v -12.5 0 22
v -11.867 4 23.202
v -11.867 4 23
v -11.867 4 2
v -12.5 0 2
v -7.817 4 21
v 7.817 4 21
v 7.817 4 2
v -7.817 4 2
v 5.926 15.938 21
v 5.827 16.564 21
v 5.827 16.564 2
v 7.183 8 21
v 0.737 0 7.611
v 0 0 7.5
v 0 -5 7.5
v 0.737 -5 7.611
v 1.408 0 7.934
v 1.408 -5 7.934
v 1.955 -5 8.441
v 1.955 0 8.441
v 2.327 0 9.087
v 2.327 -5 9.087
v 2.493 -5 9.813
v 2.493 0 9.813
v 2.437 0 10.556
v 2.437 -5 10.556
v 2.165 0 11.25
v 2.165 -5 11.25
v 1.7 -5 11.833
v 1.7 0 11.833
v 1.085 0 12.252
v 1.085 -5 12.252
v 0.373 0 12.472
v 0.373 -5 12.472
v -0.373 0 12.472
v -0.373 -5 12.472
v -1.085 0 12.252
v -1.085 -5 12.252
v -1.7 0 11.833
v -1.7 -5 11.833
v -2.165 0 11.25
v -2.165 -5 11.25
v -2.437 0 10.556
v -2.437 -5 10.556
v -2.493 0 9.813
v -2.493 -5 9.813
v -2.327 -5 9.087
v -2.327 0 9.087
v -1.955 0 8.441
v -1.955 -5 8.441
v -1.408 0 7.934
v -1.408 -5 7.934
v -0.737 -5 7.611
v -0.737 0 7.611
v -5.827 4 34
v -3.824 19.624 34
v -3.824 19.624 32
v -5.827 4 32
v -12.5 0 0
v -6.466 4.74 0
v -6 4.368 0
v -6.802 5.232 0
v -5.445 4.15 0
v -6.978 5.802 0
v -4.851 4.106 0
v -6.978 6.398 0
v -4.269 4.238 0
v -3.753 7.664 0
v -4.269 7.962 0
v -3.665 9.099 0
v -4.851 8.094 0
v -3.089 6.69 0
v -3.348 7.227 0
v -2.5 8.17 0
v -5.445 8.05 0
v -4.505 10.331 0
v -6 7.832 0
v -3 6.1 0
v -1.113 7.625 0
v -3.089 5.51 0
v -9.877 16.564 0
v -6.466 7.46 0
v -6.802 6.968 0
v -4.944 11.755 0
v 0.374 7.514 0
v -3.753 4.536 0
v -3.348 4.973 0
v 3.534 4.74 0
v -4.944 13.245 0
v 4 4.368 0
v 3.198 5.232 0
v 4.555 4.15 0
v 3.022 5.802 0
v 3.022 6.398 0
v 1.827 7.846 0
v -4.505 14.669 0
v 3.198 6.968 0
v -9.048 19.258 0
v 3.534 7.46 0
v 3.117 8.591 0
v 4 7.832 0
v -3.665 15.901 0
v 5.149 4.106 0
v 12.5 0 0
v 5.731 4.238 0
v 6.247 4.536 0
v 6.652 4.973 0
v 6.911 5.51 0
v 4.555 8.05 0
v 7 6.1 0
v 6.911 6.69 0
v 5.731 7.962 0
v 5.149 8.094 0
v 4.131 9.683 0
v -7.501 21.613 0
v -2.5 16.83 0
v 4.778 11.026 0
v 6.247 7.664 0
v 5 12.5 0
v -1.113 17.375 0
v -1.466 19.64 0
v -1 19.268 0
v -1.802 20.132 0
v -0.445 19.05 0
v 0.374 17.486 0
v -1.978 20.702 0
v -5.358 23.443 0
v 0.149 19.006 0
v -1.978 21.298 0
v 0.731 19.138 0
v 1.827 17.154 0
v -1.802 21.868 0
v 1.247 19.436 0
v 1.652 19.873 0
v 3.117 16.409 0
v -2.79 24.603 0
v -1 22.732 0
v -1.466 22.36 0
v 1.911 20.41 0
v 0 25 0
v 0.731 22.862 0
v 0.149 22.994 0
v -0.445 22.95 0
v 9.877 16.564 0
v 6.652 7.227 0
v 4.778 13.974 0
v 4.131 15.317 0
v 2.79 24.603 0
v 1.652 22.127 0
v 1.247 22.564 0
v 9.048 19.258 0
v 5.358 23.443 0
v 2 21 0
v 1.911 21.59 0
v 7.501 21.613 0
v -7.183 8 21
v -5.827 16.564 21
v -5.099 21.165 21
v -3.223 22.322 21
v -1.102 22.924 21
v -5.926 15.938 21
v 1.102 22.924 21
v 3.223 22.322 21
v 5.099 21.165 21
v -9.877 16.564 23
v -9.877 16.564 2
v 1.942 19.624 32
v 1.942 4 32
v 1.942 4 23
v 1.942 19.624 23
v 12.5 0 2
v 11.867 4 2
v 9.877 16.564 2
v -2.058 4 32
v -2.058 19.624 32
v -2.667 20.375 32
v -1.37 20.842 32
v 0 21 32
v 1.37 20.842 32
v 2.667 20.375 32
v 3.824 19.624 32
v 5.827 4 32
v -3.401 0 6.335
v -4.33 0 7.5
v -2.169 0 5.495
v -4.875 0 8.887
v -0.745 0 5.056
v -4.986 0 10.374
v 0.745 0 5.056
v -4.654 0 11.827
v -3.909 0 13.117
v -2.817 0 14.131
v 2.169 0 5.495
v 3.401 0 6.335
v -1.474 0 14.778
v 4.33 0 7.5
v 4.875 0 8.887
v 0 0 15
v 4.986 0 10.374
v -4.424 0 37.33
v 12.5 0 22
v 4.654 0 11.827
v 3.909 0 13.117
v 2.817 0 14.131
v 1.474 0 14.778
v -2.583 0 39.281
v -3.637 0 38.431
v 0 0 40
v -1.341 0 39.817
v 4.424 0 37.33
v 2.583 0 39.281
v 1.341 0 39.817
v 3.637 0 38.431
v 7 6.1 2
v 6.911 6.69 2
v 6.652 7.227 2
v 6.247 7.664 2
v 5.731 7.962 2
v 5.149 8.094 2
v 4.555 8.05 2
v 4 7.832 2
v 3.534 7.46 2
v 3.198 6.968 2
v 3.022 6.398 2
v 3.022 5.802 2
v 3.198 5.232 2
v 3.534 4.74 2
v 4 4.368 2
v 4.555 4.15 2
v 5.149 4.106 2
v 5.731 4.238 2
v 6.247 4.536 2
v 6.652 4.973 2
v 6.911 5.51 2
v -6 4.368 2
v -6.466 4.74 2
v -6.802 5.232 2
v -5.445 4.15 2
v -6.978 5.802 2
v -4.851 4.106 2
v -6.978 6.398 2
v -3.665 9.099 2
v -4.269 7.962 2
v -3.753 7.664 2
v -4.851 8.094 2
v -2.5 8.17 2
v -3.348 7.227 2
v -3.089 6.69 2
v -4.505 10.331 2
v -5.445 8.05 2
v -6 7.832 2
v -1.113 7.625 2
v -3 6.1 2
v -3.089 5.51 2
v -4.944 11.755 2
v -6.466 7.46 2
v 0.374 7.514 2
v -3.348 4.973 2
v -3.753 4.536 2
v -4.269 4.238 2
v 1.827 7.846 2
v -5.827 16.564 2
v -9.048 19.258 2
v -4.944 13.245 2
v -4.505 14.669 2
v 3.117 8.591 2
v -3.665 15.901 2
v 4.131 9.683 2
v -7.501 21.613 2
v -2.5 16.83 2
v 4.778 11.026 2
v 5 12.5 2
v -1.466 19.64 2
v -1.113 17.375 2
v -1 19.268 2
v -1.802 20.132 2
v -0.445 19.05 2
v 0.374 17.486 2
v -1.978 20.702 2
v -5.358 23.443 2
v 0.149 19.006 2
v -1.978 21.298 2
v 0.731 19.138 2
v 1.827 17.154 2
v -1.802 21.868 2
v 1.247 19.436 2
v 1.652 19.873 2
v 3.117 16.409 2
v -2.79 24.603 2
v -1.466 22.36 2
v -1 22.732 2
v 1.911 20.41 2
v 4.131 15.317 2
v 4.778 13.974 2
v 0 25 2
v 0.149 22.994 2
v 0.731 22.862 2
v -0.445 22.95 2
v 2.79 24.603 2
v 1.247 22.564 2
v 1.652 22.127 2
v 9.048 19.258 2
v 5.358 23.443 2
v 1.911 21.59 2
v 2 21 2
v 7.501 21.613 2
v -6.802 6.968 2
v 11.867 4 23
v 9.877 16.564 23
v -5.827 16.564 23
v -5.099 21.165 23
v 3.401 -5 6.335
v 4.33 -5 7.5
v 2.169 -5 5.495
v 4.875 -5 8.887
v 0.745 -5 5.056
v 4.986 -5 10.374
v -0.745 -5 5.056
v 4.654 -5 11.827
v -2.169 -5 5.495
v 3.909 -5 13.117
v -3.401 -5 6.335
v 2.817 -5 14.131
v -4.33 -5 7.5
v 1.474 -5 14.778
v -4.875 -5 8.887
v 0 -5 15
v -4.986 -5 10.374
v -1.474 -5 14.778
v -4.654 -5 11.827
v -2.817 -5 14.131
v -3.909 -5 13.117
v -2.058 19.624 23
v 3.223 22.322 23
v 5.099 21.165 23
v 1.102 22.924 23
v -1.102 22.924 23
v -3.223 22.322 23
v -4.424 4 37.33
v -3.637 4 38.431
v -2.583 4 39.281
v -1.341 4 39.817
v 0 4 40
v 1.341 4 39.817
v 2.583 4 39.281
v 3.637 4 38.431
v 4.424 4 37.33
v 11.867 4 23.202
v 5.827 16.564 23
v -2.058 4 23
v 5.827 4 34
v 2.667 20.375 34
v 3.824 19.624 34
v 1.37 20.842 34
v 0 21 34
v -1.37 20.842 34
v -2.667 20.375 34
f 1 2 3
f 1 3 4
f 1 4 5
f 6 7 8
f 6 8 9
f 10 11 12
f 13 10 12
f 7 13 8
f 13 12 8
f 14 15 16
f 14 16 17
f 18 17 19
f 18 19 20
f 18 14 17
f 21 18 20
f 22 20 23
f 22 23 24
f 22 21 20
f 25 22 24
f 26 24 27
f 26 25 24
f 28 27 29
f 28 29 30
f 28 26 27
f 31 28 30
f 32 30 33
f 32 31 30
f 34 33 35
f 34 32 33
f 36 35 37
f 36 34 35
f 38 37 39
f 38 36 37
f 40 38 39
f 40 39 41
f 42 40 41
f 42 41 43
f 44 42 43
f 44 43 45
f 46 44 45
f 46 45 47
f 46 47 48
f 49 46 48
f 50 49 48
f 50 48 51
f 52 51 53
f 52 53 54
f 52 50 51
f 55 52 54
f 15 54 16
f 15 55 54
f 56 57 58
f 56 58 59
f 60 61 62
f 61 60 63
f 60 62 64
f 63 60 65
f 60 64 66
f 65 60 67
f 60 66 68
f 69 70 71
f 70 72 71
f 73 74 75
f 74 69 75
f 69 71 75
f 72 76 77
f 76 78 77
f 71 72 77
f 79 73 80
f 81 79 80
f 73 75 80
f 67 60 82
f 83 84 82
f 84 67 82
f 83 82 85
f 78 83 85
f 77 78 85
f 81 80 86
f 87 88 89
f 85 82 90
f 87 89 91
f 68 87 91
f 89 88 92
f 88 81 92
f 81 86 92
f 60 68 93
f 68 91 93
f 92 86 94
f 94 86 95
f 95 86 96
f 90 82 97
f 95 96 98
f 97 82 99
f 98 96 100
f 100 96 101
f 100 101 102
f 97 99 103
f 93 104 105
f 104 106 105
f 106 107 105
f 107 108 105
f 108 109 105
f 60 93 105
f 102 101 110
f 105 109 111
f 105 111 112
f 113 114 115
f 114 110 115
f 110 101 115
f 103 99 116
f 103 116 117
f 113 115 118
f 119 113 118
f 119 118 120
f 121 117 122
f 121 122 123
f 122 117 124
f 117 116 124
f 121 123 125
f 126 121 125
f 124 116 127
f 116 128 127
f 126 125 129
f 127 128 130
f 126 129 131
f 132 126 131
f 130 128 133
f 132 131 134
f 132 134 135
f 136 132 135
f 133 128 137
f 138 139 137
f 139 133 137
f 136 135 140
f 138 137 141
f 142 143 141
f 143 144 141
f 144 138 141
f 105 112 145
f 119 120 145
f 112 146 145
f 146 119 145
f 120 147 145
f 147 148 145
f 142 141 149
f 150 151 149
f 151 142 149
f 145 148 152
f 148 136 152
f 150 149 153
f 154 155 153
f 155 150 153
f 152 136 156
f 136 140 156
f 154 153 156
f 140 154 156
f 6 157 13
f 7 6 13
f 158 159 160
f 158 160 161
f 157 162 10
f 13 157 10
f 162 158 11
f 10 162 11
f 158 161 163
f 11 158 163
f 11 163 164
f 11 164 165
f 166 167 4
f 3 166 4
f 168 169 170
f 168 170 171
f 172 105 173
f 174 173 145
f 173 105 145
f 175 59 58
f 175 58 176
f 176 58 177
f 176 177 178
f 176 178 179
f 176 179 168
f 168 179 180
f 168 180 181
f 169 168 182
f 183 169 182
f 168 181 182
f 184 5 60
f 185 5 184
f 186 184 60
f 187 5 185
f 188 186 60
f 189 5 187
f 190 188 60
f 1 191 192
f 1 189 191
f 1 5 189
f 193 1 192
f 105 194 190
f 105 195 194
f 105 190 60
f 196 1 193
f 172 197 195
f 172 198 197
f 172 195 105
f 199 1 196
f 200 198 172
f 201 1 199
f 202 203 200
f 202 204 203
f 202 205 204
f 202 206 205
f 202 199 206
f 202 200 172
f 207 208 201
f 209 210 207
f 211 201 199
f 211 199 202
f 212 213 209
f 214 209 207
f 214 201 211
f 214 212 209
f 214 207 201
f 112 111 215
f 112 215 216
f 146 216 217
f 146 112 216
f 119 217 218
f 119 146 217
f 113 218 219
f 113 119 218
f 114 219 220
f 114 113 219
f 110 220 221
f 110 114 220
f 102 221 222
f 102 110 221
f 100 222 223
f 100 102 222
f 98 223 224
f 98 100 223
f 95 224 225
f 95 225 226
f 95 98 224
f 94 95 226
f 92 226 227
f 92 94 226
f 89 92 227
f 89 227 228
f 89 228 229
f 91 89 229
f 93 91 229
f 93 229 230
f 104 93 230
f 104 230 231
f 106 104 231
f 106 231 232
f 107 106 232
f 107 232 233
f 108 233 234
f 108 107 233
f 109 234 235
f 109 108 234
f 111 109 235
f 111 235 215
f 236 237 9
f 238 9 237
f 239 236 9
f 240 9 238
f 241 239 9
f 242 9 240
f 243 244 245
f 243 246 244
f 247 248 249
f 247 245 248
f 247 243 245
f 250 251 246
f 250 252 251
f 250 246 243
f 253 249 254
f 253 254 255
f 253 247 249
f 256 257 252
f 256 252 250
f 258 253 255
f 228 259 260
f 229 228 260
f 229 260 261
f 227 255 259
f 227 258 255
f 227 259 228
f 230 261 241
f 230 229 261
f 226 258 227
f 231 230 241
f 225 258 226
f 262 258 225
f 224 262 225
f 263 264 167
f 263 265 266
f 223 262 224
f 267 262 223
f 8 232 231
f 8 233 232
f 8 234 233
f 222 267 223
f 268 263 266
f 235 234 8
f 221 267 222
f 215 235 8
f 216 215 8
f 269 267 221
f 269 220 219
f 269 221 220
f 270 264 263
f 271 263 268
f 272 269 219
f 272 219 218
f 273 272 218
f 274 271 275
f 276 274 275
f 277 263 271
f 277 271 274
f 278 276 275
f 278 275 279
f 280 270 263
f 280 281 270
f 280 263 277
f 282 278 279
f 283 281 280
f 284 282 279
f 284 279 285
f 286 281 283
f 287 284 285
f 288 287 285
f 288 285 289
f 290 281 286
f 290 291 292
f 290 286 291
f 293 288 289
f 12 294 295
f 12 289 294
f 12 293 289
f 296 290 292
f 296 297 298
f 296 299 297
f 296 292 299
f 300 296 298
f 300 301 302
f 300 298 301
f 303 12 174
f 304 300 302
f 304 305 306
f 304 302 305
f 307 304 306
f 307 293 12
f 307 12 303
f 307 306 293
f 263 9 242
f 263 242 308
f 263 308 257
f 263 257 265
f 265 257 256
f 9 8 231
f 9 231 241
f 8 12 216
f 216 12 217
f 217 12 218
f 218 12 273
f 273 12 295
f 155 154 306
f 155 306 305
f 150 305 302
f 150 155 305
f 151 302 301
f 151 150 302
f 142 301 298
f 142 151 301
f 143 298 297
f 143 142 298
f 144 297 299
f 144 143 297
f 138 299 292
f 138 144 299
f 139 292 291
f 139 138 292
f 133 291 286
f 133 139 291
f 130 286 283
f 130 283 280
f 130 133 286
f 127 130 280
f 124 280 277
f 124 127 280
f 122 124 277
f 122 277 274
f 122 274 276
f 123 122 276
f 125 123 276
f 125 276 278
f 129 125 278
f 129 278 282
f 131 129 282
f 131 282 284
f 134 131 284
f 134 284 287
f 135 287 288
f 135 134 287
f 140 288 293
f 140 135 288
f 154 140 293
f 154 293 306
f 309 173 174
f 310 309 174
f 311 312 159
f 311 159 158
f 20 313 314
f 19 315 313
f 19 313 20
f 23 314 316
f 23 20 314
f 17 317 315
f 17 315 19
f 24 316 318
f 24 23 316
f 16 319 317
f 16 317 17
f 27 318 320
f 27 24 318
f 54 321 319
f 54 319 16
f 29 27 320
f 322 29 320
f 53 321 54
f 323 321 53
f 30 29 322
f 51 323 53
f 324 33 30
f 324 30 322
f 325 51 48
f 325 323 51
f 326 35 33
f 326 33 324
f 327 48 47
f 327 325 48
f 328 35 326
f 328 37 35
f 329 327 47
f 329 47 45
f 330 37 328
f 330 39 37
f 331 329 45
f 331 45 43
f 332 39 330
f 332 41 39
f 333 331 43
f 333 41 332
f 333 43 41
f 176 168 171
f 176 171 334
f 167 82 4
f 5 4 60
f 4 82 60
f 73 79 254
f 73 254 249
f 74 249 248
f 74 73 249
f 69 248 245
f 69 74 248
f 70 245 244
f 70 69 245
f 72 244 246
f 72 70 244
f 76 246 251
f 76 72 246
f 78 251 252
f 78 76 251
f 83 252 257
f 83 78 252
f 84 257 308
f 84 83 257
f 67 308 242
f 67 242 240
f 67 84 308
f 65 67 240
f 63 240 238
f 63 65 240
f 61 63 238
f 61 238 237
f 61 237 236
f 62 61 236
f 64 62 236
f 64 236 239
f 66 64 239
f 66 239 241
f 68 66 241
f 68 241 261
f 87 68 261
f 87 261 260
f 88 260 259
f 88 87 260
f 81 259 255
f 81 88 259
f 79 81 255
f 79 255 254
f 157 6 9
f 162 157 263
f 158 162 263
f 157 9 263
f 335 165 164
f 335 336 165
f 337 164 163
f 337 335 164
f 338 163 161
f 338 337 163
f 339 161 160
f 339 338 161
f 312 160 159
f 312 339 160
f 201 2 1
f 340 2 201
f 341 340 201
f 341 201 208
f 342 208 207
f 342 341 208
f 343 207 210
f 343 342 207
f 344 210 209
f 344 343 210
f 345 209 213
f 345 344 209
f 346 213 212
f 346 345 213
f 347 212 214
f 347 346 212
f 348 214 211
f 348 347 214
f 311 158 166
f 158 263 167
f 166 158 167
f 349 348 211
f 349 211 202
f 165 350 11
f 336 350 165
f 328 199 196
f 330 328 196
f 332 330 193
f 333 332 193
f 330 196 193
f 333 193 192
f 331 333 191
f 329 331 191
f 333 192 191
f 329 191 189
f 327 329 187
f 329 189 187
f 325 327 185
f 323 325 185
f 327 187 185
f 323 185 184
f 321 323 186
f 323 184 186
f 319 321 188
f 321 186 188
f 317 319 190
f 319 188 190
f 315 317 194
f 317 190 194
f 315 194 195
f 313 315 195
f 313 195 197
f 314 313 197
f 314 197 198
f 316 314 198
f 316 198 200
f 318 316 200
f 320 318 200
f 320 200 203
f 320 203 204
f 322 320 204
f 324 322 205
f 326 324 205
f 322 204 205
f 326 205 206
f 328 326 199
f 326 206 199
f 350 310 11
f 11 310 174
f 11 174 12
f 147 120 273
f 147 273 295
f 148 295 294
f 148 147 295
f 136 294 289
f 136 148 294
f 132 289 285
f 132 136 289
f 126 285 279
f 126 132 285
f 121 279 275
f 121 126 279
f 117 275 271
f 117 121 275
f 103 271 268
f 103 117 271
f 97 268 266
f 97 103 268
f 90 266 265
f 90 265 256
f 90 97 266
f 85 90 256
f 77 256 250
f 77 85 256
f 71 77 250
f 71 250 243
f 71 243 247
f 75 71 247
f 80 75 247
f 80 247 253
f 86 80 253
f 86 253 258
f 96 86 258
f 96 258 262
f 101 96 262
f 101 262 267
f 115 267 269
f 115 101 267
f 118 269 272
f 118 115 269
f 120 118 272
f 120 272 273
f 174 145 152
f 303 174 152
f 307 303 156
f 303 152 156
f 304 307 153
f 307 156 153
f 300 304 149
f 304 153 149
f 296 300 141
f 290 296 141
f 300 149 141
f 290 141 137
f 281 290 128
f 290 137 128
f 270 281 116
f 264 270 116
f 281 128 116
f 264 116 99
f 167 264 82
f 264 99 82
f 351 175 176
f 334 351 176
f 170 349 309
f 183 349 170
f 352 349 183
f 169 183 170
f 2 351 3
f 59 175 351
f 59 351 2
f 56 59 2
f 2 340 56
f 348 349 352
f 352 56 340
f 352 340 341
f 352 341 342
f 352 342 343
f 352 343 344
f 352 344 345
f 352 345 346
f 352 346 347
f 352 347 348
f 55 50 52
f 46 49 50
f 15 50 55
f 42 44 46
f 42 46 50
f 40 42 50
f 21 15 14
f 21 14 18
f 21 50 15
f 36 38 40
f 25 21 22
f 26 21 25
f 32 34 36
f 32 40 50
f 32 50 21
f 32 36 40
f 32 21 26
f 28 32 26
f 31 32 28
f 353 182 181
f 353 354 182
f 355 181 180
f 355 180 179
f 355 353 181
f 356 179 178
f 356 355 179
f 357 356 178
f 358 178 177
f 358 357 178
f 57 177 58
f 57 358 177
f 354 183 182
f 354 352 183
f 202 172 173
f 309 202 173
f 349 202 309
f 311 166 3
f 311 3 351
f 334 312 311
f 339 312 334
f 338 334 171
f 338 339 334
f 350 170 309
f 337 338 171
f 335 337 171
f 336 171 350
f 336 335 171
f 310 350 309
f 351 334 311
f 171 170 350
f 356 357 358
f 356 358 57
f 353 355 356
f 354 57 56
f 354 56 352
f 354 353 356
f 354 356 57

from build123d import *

# Parameters (mm, degrees)
SKETCH1_R           = 5
SKETCH1_R_2         = 2
BOSS_EXTRUDE1_DEPTH = 2
BOSS_EXTRUDE2_DEPTH = 48
BOSS_EXTRUDE3_DEPTH = 1
CUT_EXTRUDE2_DEPTH  = 36
BOSS_EXTRUDE4_DEPTH = 21
BOSS_EXTRUDE5_DEPTH = 1
SKETCH8_W           = 4
SKETCH8_H           = 15.623627573
BOSS_EXTRUDE6_DEPTH = 9
SKETCH11_R          = 5
SKETCH11_R_2        = 2.5
BOSS_EXTRUDE7_DEPTH = 5


with BuildPart() as part:
    # Sketch1 → Boss-Extrude1 (new body)
    with BuildSketch(Plane.XY):
        with BuildLine():
            Line((-12.5, 0), (12.5, 0))
            Line((12.5, 0), (9.876921901, 16.564101584))
            ThreePointArc((9.876921901, 16.564101584), (0, 25), (-9.876921901, 16.564101584))
            Line((-9.876921901, 16.564101584), (-12.5, 0))
        make_face()
        with Locations((0, 12.5)):
            Circle(SKETCH1_R, mode=Mode.SUBTRACT)
        with Locations((5, 6.1)):
            Circle(SKETCH1_R_2, mode=Mode.SUBTRACT)
        with Locations((-5, 6.1)):
            Circle(SKETCH1_R_2, mode=Mode.SUBTRACT)
        with Locations((0, 21)):
            Circle(SKETCH1_R_2, mode=Mode.SUBTRACT)
    extrude(amount=BOSS_EXTRUDE1_DEPTH)

    # Sketch2 → Boss-Extrude2 (add)
    with BuildSketch(Plane(origin=(0, 0, 50), x_dir=(-1, 0, 0), z_dir=(0, 0, -1))):
        Polygon((12.5, 0), (-12.5, 0), (-11.866563146, 4), (11.866563146, 4), align=None)
    extrude(amount=BOSS_EXTRUDE2_DEPTH)

    # Sketch3 → Boss-Extrude3 (add, symmetric)
    with BuildSketch(Plane.XY.offset(22)):
        with BuildLine():
            ThreePointArc((5.92615314, 15.93846095), (0, 21), (-5.92615314, 15.93846095))
            Line((-5.92615314, 15.93846095), (-7.183281573, 8))
            Line((-7.183281573, 8), (-7.816718427, 4))
            Line((-7.816718427, 4), (7.816718427, 4))
            Line((7.816718427, 4), (7.183281573, 8))
            Line((7.183281573, 8), (5.92615314, 15.93846095))
        make_face()
        with BuildLine():
            Line((5.92615314, 15.93846095), (5.098508377, 21.164836764))
            ThreePointArc((5.098508377, 21.164836764), (0, 23), (-5.098508377, 21.164836764))
            Line((-5.098508377, 21.164836764), (-5.92615314, 15.93846095))
            ThreePointArc((-5.92615314, 15.93846095), (0, 21), (5.92615314, 15.93846095))
        make_face()
    extrude(amount=BOSS_EXTRUDE3_DEPTH, both=True)

    # Sketch4 → Cut-Extrude2 (cut)
    with BuildSketch(Plane(origin=(0, 4, 0), x_dir=(1, 0, 0), z_dir=(0, 1, 0))):
        with BuildLine():
            Line((-12.5, -22), (-4.423680321, -37.330461847))
            ThreePointArc((-4.423680321, -37.330461847), (0, -40), (4.423680321, -37.330461847))
            Line((4.423680321, -37.330461847), (12.5, -22))
            Line((12.5, -22), (16.181982352, -22))
            Line((16.181982352, -22), (16.181982352, -36.988467345))
            Line((16.181982352, -36.988467345), (30.820243312, -58.391823719))
            Line((30.820243312, -58.391823719), (-16.187396411, -58.391823719))
            Line((-16.187396411, -58.391823719), (-16.187396411, -22))
            Line((-16.187396411, -22), (-12.5, -22))
        make_face()
    extrude(amount=-CUT_EXTRUDE2_DEPTH, mode=Mode.SUBTRACT)

    # Sketch6 → Boss-Extrude4 (add)
    with BuildSketch(Plane.XY.offset(2)):
        Polygon((-7.866563146, 4), (-7.816718427, 4), (-5.827077182, 16.564101584), (-9.876921901, 16.564101584), (-11.866563146, 4), align=None)
        Polygon((7.866563146, 4), (11.866563146, 4), (9.876921901, 16.564101584), (5.827077182, 16.564101584), (7.816718427, 4), align=None)
    extrude(amount=BOSS_EXTRUDE4_DEPTH)

    # Sketch7 → Boss-Extrude5 (add, symmetric)
    with BuildSketch(Plane.XY.offset(33)):
        with BuildLine():
            ThreePointArc((3.823881283, 19.623627573), (2.032022953, 20.645430251), (0, 21))
            Line((0, 21), (0, 4))
            Line((0, 4), (5.827077182, 4))
            Line((5.827077182, 4), (3.823881283, 19.623627573))
        make_face()
        with BuildLine():
            ThreePointArc((0, 21), (-2.032022953, 20.645430251), (-3.823881283, 19.623627573))
            Line((-3.823881283, 19.623627573), (-5.827077182, 4))
            Line((-5.827077182, 4), (0, 4))
            Line((0, 4), (0, 21))
        make_face()
    extrude(amount=BOSS_EXTRUDE5_DEPTH, both=True)

    # Sketch8 → Boss-Extrude6 (add)
    with BuildSketch(Plane(origin=(0, 0, 32), x_dir=(-1, 0, 0), z_dir=(0, 0, -1))):
        with Locations((0.057647427, 11.811813787)):
            Rectangle(SKETCH8_W, SKETCH8_H)
    extrude(amount=BOSS_EXTRUDE6_DEPTH)

    # Sketch11 → Boss-Extrude7 (add)
    with BuildSketch(Plane.XZ):
        with Locations(Location((0, 10, 0), (0, 0, 90))):
            Circle(SKETCH11_R)
        with Locations(Location((0, 10, 0), (0, 0, 270))):
            Circle(SKETCH11_R_2, mode=Mode.SUBTRACT)
    extrude(amount=BOSS_EXTRUDE7_DEPTH)


solid = part.part
